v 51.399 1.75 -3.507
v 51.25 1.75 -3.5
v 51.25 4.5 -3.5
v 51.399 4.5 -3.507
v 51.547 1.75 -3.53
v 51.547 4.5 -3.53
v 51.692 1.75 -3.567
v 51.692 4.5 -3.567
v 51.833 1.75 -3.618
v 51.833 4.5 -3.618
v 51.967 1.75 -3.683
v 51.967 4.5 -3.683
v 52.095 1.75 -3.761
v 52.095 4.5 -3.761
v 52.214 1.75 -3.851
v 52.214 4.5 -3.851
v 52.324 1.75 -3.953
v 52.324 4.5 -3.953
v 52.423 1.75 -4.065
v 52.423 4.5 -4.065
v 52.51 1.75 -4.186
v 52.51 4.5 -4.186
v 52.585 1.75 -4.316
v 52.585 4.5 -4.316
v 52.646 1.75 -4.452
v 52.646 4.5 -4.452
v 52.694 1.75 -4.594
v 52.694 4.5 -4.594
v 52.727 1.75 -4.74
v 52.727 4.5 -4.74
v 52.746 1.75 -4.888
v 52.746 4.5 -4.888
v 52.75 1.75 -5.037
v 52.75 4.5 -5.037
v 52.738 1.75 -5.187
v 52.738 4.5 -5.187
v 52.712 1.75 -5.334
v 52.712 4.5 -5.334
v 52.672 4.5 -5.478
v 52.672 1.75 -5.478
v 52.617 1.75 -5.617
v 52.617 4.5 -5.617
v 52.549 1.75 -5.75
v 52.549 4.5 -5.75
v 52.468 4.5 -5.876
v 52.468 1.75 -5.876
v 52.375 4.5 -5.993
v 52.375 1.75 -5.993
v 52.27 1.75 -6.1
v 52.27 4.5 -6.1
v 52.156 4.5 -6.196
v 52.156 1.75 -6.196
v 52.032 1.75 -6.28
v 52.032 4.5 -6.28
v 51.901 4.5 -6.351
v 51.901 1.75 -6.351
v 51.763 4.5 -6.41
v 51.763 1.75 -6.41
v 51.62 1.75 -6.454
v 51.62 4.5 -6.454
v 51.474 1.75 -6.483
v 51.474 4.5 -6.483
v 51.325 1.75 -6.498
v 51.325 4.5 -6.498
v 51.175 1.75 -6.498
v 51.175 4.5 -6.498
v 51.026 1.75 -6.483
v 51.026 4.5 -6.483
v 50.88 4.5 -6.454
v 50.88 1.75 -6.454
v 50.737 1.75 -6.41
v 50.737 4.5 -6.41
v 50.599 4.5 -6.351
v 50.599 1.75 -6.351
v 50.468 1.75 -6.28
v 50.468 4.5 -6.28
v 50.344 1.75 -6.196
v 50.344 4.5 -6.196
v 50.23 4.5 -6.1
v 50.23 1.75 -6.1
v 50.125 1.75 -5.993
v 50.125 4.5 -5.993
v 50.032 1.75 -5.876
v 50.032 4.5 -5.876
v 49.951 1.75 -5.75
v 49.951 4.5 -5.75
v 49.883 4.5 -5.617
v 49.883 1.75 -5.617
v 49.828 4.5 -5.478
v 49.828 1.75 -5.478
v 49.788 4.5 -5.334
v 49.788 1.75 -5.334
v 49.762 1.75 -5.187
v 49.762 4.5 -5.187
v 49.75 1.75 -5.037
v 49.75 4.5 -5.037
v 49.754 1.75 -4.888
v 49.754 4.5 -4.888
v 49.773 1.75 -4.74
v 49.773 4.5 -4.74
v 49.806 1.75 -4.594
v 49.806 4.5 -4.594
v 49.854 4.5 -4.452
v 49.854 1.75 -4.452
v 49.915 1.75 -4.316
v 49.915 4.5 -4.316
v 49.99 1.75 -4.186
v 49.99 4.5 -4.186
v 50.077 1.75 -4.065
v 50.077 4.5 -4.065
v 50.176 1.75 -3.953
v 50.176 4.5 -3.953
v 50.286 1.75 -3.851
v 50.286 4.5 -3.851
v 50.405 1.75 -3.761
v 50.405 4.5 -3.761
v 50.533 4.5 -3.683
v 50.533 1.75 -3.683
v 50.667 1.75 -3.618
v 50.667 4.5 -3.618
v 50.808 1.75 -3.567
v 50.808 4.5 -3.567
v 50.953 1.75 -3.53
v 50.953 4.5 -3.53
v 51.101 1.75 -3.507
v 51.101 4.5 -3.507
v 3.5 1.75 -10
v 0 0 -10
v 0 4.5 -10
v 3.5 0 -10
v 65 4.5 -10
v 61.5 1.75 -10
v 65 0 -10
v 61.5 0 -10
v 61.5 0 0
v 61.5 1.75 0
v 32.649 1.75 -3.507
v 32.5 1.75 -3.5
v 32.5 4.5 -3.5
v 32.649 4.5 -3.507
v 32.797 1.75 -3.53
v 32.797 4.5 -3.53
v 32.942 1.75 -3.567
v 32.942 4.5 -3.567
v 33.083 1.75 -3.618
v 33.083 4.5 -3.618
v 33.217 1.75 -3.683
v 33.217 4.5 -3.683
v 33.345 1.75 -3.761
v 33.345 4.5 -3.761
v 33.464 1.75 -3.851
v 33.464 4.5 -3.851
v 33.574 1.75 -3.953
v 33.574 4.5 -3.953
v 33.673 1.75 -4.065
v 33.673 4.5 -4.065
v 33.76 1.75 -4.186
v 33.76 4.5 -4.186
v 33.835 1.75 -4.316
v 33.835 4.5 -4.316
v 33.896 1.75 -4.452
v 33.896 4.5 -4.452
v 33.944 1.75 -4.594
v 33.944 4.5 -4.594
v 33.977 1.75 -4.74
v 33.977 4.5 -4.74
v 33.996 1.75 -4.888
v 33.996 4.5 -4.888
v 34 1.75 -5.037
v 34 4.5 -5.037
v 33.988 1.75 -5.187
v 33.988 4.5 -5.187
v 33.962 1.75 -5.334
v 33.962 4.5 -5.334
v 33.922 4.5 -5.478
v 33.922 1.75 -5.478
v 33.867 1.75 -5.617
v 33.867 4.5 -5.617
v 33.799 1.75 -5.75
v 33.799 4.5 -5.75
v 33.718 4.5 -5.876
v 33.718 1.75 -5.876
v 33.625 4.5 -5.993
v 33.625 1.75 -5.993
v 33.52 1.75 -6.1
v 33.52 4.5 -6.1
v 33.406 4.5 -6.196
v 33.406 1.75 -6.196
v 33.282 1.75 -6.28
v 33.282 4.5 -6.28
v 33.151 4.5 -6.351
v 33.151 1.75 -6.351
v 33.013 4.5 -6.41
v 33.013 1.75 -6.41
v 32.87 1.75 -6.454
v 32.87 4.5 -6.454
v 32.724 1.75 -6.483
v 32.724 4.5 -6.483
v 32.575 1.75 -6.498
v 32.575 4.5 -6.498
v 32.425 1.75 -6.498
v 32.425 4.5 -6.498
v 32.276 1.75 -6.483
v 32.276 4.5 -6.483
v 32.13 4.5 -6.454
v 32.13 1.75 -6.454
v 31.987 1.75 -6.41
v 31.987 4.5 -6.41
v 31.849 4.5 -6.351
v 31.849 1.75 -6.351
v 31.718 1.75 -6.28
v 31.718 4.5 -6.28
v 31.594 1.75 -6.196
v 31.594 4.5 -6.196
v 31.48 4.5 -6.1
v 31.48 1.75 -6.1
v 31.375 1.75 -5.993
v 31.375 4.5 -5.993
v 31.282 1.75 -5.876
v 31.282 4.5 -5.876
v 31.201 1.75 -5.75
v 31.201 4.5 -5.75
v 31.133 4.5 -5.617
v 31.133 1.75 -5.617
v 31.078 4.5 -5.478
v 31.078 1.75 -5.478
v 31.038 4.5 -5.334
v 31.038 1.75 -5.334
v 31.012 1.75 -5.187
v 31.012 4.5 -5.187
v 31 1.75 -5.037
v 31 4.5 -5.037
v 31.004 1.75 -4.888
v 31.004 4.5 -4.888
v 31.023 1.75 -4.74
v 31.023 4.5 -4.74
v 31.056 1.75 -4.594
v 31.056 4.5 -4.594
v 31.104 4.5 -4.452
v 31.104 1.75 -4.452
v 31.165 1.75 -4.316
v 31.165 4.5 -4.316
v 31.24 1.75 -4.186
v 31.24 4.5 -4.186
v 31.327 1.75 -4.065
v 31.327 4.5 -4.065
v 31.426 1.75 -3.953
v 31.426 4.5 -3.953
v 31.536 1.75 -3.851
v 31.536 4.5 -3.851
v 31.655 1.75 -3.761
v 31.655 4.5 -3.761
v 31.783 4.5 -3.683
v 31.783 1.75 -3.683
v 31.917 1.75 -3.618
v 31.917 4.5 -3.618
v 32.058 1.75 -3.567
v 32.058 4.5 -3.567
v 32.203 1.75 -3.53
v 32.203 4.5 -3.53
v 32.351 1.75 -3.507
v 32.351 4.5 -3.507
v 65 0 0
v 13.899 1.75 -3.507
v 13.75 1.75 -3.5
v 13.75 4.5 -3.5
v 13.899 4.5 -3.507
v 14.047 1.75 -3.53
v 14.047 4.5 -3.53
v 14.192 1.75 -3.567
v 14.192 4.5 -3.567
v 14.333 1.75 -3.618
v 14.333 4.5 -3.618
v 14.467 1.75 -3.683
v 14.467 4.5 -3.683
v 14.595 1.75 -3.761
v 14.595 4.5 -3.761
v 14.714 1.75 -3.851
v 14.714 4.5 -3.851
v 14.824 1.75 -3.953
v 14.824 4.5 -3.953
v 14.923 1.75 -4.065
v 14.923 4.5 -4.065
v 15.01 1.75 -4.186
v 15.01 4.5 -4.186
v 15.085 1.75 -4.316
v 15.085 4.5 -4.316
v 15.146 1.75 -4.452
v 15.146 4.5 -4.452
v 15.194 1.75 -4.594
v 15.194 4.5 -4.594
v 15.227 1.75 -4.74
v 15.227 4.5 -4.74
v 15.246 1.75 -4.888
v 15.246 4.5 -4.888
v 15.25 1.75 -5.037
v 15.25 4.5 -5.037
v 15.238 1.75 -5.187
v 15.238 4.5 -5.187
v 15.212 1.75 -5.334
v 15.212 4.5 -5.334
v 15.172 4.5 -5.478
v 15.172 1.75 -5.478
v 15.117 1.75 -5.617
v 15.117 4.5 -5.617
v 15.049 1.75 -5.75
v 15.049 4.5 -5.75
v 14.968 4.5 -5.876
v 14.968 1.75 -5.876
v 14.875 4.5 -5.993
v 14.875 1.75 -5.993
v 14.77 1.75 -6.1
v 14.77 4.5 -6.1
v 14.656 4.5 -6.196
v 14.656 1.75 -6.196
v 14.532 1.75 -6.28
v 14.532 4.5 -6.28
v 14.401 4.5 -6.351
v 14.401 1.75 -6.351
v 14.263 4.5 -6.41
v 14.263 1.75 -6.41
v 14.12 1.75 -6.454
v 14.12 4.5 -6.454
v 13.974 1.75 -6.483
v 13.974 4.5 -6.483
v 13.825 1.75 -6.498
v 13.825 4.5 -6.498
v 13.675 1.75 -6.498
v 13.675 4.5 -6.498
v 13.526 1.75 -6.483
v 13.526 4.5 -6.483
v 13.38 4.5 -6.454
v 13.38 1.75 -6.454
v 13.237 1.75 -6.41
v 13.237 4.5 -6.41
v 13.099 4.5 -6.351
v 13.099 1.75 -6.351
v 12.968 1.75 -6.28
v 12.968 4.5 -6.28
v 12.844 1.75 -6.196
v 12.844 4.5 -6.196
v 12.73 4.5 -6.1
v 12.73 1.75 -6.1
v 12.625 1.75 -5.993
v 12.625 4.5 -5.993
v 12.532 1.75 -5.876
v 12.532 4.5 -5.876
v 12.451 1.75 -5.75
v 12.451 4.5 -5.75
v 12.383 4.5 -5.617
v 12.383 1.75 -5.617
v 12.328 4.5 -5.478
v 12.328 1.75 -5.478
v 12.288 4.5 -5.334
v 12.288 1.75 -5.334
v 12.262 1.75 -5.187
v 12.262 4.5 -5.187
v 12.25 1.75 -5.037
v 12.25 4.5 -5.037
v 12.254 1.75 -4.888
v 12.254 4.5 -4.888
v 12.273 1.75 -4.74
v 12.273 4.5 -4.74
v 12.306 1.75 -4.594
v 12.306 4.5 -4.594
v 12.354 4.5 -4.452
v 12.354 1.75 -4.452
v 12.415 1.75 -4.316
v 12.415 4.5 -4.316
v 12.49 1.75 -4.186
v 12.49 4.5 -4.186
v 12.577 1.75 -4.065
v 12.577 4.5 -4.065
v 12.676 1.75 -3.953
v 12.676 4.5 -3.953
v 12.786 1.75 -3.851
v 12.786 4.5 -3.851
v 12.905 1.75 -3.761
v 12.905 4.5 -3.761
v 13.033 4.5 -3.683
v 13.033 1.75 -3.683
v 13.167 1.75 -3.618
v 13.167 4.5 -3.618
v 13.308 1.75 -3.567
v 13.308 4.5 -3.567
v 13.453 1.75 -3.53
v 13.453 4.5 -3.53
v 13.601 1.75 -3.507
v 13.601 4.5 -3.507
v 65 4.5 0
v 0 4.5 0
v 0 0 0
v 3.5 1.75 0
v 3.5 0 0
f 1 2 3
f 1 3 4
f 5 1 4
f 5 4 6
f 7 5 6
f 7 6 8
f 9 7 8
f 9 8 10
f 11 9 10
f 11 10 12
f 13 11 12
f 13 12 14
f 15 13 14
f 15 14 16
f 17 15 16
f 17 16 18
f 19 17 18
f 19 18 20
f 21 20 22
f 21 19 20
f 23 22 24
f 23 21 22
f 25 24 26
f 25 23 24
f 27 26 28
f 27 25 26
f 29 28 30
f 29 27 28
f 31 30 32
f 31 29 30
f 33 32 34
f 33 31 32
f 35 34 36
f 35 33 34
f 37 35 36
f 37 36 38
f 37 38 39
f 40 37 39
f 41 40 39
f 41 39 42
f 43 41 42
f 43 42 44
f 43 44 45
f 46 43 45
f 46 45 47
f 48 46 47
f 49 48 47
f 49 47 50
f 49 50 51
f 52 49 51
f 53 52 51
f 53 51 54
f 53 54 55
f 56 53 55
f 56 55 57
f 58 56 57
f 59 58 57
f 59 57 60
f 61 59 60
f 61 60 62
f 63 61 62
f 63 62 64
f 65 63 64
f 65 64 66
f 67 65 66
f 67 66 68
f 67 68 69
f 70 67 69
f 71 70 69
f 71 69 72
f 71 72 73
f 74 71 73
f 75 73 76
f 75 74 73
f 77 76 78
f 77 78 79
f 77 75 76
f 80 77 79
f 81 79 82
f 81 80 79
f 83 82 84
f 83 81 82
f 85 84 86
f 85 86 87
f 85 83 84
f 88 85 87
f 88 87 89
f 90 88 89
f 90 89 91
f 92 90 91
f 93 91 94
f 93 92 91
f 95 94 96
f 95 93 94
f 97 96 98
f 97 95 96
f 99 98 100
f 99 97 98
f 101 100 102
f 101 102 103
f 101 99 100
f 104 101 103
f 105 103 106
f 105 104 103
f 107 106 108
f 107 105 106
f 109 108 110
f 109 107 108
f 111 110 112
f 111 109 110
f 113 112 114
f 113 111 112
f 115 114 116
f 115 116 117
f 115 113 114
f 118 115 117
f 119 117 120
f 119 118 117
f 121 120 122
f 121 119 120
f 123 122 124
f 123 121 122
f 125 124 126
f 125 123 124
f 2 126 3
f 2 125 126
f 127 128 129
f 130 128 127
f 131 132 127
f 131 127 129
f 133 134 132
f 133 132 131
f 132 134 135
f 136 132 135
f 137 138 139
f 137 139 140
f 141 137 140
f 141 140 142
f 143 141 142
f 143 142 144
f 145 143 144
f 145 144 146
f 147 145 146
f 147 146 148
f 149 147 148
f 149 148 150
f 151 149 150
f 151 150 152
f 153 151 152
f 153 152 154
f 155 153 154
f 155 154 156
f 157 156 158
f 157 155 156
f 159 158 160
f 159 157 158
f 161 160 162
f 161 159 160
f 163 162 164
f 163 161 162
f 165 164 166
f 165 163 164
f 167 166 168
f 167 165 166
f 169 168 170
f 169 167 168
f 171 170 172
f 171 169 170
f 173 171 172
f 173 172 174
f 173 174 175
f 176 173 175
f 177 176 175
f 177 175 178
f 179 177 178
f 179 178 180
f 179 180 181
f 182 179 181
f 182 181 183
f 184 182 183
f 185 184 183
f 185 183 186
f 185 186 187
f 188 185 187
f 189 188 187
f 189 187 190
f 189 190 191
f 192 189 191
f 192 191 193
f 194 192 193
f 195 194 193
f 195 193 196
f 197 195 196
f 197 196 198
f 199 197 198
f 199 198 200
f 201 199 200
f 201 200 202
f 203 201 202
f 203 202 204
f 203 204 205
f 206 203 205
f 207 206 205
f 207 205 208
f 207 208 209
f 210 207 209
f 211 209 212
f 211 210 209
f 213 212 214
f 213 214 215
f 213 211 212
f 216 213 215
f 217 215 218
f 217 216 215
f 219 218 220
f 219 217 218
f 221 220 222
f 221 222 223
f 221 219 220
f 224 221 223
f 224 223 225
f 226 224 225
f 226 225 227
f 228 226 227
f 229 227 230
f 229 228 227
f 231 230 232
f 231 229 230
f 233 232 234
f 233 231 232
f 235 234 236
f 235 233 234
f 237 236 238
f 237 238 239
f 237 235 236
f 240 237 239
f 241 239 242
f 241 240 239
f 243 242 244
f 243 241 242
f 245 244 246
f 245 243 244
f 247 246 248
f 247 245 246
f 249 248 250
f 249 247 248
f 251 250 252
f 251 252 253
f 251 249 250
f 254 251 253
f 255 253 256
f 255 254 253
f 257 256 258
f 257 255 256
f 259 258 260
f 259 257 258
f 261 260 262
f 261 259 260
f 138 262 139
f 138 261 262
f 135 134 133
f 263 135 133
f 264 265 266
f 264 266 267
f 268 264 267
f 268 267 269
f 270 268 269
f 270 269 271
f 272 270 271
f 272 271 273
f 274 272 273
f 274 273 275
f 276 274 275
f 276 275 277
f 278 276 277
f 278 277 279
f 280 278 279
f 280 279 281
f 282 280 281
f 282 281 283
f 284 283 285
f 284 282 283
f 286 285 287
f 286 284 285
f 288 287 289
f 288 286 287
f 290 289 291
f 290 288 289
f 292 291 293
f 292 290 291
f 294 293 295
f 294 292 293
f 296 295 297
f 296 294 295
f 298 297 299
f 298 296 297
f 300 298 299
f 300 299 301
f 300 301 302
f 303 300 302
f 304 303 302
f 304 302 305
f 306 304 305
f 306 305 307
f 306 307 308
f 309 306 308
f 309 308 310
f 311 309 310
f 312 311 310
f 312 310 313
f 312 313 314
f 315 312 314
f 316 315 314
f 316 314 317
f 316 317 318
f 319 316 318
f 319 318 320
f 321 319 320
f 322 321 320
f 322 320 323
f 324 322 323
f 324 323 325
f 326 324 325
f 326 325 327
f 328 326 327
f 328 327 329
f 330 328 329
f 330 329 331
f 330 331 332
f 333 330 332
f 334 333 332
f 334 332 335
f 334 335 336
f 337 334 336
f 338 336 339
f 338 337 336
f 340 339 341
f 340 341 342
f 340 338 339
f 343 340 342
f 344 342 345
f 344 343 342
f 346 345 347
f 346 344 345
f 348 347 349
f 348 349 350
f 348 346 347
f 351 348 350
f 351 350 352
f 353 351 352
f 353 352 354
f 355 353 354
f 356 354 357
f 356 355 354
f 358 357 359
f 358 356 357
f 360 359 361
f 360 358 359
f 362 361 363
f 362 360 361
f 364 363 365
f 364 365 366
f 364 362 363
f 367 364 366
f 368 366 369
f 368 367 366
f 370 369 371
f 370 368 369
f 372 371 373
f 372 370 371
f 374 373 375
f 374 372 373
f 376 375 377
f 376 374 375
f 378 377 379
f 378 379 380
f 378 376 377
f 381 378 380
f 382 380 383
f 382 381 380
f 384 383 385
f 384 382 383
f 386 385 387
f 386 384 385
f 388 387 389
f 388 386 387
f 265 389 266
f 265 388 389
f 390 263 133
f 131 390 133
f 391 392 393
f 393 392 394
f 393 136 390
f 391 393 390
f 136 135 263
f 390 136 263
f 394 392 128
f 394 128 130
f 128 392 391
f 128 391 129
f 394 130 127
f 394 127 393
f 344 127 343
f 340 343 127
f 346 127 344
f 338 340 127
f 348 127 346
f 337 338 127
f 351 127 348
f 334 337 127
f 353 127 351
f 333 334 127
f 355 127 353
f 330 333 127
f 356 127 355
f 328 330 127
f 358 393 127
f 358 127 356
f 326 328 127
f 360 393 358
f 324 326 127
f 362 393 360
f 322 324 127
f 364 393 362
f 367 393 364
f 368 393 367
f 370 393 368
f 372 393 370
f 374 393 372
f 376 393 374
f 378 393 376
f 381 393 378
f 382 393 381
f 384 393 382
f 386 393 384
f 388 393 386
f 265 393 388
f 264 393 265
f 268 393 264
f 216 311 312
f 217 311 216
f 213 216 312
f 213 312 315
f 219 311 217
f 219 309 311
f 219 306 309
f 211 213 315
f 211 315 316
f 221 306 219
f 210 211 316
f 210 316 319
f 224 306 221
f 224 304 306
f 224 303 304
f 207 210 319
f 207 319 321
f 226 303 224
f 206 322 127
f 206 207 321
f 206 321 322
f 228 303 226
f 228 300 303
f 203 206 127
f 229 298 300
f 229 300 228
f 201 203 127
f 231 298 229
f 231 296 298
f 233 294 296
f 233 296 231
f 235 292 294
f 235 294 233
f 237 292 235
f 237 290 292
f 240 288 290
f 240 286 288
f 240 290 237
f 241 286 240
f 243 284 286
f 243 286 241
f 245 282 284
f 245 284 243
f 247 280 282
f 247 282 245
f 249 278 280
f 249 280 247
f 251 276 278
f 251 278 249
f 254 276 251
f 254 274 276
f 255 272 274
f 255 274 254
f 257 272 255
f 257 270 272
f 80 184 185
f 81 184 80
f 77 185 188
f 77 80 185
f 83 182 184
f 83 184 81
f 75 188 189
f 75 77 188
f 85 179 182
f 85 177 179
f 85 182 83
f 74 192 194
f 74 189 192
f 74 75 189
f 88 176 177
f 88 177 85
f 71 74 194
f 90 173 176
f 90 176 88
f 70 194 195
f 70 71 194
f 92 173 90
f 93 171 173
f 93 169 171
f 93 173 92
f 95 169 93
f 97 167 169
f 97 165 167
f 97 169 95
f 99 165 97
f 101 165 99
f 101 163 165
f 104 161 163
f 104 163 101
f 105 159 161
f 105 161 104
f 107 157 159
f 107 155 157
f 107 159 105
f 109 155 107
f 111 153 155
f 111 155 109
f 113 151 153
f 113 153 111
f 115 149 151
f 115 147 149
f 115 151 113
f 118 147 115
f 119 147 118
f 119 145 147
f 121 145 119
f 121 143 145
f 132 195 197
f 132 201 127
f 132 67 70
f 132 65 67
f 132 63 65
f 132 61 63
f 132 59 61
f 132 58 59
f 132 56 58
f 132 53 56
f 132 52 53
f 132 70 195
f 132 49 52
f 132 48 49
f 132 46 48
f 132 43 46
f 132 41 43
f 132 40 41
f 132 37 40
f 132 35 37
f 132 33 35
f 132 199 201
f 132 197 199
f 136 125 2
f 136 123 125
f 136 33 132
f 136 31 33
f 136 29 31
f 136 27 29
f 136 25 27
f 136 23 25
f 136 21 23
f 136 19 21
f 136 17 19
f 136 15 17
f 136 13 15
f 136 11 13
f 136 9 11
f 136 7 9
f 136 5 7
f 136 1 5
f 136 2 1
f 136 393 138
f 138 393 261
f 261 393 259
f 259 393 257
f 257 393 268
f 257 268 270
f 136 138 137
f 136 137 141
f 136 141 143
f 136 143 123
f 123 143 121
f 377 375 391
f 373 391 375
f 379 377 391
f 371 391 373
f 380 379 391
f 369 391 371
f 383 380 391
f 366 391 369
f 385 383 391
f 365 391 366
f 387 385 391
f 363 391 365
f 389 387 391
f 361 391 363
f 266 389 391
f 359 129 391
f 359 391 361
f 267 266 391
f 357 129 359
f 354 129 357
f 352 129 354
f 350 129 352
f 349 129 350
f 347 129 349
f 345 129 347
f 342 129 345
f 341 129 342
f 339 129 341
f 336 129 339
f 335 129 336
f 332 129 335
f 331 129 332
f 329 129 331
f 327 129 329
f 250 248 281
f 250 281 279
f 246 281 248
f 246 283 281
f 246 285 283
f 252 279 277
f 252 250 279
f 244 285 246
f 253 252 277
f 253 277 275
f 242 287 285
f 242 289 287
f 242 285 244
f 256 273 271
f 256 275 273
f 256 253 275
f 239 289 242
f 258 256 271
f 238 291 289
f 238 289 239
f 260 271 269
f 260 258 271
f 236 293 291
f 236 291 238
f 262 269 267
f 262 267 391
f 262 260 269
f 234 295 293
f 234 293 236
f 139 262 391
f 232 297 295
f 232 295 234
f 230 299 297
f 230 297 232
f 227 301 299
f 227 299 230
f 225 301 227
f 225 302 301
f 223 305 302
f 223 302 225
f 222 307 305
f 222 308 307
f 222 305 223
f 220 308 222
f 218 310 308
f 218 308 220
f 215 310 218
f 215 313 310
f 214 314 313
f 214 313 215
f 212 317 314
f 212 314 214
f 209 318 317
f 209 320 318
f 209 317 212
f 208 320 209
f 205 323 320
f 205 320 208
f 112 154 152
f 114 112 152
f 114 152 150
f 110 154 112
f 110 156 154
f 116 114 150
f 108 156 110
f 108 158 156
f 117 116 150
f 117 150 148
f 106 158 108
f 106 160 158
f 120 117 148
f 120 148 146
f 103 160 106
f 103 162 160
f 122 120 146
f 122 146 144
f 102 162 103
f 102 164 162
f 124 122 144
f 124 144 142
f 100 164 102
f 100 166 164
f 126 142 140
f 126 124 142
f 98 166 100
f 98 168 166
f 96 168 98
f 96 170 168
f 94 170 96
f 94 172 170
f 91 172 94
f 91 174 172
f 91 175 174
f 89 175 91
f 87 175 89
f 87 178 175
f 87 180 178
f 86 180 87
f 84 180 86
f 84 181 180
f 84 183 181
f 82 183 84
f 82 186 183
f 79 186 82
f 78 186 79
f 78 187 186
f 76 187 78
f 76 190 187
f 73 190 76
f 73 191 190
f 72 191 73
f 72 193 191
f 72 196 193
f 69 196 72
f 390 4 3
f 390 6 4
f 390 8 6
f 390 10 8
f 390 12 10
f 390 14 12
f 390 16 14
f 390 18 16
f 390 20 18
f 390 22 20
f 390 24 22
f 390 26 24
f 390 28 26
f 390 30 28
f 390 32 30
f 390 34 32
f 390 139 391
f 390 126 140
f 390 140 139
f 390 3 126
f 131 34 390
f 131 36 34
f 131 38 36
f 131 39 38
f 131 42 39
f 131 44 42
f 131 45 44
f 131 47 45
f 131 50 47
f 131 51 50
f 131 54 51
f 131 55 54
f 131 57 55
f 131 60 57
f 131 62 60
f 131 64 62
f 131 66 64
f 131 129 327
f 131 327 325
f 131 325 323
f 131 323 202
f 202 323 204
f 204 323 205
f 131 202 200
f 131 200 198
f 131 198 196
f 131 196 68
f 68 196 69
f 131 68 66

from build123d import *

# Parameters (mm, degrees)
SKETCH1_W           = 65
SKETCH1_H           = 10
SKETCH1_R           = 1.5
BOSS_EXTRUDE1_DEPTH = 4.5
SKETCH2_W           = 58
SKETCH2_H           = 10
CUT_EXTRUDE1_DEPTH  = 1.75


with BuildPart() as part:
    # Sketch1 → Boss-Extrude1 (new body)
    with BuildSketch(Plane(origin=(0, 0, 0), x_dir=(1, 0, 0), z_dir=(0, 1, 0))):
        with Locations((32.5, 5)):
            Rectangle(SKETCH1_W, SKETCH1_H)
        with Locations(Location((13.75, 5, 0), (0, 0, 270))):
            Circle(SKETCH1_R, mode=Mode.SUBTRACT)
        with Locations(Location((32.5, 5, 0), (0, 0, 270))):
            Circle(SKETCH1_R, mode=Mode.SUBTRACT)
        with Locations(Location((51.25, 5, 0), (0, 0, 270))):
            Circle(SKETCH1_R, mode=Mode.SUBTRACT)
    extrude(amount=BOSS_EXTRUDE1_DEPTH)

    # Sketch2 → Cut-Extrude1 (cut)
    with BuildSketch(Plane.XZ):
        with Locations((32.5, -5)):
            Rectangle(SKETCH2_W, SKETCH2_H)
    extrude(amount=-CUT_EXTRUDE1_DEPTH, mode=Mode.SUBTRACT)


solid = part.part
